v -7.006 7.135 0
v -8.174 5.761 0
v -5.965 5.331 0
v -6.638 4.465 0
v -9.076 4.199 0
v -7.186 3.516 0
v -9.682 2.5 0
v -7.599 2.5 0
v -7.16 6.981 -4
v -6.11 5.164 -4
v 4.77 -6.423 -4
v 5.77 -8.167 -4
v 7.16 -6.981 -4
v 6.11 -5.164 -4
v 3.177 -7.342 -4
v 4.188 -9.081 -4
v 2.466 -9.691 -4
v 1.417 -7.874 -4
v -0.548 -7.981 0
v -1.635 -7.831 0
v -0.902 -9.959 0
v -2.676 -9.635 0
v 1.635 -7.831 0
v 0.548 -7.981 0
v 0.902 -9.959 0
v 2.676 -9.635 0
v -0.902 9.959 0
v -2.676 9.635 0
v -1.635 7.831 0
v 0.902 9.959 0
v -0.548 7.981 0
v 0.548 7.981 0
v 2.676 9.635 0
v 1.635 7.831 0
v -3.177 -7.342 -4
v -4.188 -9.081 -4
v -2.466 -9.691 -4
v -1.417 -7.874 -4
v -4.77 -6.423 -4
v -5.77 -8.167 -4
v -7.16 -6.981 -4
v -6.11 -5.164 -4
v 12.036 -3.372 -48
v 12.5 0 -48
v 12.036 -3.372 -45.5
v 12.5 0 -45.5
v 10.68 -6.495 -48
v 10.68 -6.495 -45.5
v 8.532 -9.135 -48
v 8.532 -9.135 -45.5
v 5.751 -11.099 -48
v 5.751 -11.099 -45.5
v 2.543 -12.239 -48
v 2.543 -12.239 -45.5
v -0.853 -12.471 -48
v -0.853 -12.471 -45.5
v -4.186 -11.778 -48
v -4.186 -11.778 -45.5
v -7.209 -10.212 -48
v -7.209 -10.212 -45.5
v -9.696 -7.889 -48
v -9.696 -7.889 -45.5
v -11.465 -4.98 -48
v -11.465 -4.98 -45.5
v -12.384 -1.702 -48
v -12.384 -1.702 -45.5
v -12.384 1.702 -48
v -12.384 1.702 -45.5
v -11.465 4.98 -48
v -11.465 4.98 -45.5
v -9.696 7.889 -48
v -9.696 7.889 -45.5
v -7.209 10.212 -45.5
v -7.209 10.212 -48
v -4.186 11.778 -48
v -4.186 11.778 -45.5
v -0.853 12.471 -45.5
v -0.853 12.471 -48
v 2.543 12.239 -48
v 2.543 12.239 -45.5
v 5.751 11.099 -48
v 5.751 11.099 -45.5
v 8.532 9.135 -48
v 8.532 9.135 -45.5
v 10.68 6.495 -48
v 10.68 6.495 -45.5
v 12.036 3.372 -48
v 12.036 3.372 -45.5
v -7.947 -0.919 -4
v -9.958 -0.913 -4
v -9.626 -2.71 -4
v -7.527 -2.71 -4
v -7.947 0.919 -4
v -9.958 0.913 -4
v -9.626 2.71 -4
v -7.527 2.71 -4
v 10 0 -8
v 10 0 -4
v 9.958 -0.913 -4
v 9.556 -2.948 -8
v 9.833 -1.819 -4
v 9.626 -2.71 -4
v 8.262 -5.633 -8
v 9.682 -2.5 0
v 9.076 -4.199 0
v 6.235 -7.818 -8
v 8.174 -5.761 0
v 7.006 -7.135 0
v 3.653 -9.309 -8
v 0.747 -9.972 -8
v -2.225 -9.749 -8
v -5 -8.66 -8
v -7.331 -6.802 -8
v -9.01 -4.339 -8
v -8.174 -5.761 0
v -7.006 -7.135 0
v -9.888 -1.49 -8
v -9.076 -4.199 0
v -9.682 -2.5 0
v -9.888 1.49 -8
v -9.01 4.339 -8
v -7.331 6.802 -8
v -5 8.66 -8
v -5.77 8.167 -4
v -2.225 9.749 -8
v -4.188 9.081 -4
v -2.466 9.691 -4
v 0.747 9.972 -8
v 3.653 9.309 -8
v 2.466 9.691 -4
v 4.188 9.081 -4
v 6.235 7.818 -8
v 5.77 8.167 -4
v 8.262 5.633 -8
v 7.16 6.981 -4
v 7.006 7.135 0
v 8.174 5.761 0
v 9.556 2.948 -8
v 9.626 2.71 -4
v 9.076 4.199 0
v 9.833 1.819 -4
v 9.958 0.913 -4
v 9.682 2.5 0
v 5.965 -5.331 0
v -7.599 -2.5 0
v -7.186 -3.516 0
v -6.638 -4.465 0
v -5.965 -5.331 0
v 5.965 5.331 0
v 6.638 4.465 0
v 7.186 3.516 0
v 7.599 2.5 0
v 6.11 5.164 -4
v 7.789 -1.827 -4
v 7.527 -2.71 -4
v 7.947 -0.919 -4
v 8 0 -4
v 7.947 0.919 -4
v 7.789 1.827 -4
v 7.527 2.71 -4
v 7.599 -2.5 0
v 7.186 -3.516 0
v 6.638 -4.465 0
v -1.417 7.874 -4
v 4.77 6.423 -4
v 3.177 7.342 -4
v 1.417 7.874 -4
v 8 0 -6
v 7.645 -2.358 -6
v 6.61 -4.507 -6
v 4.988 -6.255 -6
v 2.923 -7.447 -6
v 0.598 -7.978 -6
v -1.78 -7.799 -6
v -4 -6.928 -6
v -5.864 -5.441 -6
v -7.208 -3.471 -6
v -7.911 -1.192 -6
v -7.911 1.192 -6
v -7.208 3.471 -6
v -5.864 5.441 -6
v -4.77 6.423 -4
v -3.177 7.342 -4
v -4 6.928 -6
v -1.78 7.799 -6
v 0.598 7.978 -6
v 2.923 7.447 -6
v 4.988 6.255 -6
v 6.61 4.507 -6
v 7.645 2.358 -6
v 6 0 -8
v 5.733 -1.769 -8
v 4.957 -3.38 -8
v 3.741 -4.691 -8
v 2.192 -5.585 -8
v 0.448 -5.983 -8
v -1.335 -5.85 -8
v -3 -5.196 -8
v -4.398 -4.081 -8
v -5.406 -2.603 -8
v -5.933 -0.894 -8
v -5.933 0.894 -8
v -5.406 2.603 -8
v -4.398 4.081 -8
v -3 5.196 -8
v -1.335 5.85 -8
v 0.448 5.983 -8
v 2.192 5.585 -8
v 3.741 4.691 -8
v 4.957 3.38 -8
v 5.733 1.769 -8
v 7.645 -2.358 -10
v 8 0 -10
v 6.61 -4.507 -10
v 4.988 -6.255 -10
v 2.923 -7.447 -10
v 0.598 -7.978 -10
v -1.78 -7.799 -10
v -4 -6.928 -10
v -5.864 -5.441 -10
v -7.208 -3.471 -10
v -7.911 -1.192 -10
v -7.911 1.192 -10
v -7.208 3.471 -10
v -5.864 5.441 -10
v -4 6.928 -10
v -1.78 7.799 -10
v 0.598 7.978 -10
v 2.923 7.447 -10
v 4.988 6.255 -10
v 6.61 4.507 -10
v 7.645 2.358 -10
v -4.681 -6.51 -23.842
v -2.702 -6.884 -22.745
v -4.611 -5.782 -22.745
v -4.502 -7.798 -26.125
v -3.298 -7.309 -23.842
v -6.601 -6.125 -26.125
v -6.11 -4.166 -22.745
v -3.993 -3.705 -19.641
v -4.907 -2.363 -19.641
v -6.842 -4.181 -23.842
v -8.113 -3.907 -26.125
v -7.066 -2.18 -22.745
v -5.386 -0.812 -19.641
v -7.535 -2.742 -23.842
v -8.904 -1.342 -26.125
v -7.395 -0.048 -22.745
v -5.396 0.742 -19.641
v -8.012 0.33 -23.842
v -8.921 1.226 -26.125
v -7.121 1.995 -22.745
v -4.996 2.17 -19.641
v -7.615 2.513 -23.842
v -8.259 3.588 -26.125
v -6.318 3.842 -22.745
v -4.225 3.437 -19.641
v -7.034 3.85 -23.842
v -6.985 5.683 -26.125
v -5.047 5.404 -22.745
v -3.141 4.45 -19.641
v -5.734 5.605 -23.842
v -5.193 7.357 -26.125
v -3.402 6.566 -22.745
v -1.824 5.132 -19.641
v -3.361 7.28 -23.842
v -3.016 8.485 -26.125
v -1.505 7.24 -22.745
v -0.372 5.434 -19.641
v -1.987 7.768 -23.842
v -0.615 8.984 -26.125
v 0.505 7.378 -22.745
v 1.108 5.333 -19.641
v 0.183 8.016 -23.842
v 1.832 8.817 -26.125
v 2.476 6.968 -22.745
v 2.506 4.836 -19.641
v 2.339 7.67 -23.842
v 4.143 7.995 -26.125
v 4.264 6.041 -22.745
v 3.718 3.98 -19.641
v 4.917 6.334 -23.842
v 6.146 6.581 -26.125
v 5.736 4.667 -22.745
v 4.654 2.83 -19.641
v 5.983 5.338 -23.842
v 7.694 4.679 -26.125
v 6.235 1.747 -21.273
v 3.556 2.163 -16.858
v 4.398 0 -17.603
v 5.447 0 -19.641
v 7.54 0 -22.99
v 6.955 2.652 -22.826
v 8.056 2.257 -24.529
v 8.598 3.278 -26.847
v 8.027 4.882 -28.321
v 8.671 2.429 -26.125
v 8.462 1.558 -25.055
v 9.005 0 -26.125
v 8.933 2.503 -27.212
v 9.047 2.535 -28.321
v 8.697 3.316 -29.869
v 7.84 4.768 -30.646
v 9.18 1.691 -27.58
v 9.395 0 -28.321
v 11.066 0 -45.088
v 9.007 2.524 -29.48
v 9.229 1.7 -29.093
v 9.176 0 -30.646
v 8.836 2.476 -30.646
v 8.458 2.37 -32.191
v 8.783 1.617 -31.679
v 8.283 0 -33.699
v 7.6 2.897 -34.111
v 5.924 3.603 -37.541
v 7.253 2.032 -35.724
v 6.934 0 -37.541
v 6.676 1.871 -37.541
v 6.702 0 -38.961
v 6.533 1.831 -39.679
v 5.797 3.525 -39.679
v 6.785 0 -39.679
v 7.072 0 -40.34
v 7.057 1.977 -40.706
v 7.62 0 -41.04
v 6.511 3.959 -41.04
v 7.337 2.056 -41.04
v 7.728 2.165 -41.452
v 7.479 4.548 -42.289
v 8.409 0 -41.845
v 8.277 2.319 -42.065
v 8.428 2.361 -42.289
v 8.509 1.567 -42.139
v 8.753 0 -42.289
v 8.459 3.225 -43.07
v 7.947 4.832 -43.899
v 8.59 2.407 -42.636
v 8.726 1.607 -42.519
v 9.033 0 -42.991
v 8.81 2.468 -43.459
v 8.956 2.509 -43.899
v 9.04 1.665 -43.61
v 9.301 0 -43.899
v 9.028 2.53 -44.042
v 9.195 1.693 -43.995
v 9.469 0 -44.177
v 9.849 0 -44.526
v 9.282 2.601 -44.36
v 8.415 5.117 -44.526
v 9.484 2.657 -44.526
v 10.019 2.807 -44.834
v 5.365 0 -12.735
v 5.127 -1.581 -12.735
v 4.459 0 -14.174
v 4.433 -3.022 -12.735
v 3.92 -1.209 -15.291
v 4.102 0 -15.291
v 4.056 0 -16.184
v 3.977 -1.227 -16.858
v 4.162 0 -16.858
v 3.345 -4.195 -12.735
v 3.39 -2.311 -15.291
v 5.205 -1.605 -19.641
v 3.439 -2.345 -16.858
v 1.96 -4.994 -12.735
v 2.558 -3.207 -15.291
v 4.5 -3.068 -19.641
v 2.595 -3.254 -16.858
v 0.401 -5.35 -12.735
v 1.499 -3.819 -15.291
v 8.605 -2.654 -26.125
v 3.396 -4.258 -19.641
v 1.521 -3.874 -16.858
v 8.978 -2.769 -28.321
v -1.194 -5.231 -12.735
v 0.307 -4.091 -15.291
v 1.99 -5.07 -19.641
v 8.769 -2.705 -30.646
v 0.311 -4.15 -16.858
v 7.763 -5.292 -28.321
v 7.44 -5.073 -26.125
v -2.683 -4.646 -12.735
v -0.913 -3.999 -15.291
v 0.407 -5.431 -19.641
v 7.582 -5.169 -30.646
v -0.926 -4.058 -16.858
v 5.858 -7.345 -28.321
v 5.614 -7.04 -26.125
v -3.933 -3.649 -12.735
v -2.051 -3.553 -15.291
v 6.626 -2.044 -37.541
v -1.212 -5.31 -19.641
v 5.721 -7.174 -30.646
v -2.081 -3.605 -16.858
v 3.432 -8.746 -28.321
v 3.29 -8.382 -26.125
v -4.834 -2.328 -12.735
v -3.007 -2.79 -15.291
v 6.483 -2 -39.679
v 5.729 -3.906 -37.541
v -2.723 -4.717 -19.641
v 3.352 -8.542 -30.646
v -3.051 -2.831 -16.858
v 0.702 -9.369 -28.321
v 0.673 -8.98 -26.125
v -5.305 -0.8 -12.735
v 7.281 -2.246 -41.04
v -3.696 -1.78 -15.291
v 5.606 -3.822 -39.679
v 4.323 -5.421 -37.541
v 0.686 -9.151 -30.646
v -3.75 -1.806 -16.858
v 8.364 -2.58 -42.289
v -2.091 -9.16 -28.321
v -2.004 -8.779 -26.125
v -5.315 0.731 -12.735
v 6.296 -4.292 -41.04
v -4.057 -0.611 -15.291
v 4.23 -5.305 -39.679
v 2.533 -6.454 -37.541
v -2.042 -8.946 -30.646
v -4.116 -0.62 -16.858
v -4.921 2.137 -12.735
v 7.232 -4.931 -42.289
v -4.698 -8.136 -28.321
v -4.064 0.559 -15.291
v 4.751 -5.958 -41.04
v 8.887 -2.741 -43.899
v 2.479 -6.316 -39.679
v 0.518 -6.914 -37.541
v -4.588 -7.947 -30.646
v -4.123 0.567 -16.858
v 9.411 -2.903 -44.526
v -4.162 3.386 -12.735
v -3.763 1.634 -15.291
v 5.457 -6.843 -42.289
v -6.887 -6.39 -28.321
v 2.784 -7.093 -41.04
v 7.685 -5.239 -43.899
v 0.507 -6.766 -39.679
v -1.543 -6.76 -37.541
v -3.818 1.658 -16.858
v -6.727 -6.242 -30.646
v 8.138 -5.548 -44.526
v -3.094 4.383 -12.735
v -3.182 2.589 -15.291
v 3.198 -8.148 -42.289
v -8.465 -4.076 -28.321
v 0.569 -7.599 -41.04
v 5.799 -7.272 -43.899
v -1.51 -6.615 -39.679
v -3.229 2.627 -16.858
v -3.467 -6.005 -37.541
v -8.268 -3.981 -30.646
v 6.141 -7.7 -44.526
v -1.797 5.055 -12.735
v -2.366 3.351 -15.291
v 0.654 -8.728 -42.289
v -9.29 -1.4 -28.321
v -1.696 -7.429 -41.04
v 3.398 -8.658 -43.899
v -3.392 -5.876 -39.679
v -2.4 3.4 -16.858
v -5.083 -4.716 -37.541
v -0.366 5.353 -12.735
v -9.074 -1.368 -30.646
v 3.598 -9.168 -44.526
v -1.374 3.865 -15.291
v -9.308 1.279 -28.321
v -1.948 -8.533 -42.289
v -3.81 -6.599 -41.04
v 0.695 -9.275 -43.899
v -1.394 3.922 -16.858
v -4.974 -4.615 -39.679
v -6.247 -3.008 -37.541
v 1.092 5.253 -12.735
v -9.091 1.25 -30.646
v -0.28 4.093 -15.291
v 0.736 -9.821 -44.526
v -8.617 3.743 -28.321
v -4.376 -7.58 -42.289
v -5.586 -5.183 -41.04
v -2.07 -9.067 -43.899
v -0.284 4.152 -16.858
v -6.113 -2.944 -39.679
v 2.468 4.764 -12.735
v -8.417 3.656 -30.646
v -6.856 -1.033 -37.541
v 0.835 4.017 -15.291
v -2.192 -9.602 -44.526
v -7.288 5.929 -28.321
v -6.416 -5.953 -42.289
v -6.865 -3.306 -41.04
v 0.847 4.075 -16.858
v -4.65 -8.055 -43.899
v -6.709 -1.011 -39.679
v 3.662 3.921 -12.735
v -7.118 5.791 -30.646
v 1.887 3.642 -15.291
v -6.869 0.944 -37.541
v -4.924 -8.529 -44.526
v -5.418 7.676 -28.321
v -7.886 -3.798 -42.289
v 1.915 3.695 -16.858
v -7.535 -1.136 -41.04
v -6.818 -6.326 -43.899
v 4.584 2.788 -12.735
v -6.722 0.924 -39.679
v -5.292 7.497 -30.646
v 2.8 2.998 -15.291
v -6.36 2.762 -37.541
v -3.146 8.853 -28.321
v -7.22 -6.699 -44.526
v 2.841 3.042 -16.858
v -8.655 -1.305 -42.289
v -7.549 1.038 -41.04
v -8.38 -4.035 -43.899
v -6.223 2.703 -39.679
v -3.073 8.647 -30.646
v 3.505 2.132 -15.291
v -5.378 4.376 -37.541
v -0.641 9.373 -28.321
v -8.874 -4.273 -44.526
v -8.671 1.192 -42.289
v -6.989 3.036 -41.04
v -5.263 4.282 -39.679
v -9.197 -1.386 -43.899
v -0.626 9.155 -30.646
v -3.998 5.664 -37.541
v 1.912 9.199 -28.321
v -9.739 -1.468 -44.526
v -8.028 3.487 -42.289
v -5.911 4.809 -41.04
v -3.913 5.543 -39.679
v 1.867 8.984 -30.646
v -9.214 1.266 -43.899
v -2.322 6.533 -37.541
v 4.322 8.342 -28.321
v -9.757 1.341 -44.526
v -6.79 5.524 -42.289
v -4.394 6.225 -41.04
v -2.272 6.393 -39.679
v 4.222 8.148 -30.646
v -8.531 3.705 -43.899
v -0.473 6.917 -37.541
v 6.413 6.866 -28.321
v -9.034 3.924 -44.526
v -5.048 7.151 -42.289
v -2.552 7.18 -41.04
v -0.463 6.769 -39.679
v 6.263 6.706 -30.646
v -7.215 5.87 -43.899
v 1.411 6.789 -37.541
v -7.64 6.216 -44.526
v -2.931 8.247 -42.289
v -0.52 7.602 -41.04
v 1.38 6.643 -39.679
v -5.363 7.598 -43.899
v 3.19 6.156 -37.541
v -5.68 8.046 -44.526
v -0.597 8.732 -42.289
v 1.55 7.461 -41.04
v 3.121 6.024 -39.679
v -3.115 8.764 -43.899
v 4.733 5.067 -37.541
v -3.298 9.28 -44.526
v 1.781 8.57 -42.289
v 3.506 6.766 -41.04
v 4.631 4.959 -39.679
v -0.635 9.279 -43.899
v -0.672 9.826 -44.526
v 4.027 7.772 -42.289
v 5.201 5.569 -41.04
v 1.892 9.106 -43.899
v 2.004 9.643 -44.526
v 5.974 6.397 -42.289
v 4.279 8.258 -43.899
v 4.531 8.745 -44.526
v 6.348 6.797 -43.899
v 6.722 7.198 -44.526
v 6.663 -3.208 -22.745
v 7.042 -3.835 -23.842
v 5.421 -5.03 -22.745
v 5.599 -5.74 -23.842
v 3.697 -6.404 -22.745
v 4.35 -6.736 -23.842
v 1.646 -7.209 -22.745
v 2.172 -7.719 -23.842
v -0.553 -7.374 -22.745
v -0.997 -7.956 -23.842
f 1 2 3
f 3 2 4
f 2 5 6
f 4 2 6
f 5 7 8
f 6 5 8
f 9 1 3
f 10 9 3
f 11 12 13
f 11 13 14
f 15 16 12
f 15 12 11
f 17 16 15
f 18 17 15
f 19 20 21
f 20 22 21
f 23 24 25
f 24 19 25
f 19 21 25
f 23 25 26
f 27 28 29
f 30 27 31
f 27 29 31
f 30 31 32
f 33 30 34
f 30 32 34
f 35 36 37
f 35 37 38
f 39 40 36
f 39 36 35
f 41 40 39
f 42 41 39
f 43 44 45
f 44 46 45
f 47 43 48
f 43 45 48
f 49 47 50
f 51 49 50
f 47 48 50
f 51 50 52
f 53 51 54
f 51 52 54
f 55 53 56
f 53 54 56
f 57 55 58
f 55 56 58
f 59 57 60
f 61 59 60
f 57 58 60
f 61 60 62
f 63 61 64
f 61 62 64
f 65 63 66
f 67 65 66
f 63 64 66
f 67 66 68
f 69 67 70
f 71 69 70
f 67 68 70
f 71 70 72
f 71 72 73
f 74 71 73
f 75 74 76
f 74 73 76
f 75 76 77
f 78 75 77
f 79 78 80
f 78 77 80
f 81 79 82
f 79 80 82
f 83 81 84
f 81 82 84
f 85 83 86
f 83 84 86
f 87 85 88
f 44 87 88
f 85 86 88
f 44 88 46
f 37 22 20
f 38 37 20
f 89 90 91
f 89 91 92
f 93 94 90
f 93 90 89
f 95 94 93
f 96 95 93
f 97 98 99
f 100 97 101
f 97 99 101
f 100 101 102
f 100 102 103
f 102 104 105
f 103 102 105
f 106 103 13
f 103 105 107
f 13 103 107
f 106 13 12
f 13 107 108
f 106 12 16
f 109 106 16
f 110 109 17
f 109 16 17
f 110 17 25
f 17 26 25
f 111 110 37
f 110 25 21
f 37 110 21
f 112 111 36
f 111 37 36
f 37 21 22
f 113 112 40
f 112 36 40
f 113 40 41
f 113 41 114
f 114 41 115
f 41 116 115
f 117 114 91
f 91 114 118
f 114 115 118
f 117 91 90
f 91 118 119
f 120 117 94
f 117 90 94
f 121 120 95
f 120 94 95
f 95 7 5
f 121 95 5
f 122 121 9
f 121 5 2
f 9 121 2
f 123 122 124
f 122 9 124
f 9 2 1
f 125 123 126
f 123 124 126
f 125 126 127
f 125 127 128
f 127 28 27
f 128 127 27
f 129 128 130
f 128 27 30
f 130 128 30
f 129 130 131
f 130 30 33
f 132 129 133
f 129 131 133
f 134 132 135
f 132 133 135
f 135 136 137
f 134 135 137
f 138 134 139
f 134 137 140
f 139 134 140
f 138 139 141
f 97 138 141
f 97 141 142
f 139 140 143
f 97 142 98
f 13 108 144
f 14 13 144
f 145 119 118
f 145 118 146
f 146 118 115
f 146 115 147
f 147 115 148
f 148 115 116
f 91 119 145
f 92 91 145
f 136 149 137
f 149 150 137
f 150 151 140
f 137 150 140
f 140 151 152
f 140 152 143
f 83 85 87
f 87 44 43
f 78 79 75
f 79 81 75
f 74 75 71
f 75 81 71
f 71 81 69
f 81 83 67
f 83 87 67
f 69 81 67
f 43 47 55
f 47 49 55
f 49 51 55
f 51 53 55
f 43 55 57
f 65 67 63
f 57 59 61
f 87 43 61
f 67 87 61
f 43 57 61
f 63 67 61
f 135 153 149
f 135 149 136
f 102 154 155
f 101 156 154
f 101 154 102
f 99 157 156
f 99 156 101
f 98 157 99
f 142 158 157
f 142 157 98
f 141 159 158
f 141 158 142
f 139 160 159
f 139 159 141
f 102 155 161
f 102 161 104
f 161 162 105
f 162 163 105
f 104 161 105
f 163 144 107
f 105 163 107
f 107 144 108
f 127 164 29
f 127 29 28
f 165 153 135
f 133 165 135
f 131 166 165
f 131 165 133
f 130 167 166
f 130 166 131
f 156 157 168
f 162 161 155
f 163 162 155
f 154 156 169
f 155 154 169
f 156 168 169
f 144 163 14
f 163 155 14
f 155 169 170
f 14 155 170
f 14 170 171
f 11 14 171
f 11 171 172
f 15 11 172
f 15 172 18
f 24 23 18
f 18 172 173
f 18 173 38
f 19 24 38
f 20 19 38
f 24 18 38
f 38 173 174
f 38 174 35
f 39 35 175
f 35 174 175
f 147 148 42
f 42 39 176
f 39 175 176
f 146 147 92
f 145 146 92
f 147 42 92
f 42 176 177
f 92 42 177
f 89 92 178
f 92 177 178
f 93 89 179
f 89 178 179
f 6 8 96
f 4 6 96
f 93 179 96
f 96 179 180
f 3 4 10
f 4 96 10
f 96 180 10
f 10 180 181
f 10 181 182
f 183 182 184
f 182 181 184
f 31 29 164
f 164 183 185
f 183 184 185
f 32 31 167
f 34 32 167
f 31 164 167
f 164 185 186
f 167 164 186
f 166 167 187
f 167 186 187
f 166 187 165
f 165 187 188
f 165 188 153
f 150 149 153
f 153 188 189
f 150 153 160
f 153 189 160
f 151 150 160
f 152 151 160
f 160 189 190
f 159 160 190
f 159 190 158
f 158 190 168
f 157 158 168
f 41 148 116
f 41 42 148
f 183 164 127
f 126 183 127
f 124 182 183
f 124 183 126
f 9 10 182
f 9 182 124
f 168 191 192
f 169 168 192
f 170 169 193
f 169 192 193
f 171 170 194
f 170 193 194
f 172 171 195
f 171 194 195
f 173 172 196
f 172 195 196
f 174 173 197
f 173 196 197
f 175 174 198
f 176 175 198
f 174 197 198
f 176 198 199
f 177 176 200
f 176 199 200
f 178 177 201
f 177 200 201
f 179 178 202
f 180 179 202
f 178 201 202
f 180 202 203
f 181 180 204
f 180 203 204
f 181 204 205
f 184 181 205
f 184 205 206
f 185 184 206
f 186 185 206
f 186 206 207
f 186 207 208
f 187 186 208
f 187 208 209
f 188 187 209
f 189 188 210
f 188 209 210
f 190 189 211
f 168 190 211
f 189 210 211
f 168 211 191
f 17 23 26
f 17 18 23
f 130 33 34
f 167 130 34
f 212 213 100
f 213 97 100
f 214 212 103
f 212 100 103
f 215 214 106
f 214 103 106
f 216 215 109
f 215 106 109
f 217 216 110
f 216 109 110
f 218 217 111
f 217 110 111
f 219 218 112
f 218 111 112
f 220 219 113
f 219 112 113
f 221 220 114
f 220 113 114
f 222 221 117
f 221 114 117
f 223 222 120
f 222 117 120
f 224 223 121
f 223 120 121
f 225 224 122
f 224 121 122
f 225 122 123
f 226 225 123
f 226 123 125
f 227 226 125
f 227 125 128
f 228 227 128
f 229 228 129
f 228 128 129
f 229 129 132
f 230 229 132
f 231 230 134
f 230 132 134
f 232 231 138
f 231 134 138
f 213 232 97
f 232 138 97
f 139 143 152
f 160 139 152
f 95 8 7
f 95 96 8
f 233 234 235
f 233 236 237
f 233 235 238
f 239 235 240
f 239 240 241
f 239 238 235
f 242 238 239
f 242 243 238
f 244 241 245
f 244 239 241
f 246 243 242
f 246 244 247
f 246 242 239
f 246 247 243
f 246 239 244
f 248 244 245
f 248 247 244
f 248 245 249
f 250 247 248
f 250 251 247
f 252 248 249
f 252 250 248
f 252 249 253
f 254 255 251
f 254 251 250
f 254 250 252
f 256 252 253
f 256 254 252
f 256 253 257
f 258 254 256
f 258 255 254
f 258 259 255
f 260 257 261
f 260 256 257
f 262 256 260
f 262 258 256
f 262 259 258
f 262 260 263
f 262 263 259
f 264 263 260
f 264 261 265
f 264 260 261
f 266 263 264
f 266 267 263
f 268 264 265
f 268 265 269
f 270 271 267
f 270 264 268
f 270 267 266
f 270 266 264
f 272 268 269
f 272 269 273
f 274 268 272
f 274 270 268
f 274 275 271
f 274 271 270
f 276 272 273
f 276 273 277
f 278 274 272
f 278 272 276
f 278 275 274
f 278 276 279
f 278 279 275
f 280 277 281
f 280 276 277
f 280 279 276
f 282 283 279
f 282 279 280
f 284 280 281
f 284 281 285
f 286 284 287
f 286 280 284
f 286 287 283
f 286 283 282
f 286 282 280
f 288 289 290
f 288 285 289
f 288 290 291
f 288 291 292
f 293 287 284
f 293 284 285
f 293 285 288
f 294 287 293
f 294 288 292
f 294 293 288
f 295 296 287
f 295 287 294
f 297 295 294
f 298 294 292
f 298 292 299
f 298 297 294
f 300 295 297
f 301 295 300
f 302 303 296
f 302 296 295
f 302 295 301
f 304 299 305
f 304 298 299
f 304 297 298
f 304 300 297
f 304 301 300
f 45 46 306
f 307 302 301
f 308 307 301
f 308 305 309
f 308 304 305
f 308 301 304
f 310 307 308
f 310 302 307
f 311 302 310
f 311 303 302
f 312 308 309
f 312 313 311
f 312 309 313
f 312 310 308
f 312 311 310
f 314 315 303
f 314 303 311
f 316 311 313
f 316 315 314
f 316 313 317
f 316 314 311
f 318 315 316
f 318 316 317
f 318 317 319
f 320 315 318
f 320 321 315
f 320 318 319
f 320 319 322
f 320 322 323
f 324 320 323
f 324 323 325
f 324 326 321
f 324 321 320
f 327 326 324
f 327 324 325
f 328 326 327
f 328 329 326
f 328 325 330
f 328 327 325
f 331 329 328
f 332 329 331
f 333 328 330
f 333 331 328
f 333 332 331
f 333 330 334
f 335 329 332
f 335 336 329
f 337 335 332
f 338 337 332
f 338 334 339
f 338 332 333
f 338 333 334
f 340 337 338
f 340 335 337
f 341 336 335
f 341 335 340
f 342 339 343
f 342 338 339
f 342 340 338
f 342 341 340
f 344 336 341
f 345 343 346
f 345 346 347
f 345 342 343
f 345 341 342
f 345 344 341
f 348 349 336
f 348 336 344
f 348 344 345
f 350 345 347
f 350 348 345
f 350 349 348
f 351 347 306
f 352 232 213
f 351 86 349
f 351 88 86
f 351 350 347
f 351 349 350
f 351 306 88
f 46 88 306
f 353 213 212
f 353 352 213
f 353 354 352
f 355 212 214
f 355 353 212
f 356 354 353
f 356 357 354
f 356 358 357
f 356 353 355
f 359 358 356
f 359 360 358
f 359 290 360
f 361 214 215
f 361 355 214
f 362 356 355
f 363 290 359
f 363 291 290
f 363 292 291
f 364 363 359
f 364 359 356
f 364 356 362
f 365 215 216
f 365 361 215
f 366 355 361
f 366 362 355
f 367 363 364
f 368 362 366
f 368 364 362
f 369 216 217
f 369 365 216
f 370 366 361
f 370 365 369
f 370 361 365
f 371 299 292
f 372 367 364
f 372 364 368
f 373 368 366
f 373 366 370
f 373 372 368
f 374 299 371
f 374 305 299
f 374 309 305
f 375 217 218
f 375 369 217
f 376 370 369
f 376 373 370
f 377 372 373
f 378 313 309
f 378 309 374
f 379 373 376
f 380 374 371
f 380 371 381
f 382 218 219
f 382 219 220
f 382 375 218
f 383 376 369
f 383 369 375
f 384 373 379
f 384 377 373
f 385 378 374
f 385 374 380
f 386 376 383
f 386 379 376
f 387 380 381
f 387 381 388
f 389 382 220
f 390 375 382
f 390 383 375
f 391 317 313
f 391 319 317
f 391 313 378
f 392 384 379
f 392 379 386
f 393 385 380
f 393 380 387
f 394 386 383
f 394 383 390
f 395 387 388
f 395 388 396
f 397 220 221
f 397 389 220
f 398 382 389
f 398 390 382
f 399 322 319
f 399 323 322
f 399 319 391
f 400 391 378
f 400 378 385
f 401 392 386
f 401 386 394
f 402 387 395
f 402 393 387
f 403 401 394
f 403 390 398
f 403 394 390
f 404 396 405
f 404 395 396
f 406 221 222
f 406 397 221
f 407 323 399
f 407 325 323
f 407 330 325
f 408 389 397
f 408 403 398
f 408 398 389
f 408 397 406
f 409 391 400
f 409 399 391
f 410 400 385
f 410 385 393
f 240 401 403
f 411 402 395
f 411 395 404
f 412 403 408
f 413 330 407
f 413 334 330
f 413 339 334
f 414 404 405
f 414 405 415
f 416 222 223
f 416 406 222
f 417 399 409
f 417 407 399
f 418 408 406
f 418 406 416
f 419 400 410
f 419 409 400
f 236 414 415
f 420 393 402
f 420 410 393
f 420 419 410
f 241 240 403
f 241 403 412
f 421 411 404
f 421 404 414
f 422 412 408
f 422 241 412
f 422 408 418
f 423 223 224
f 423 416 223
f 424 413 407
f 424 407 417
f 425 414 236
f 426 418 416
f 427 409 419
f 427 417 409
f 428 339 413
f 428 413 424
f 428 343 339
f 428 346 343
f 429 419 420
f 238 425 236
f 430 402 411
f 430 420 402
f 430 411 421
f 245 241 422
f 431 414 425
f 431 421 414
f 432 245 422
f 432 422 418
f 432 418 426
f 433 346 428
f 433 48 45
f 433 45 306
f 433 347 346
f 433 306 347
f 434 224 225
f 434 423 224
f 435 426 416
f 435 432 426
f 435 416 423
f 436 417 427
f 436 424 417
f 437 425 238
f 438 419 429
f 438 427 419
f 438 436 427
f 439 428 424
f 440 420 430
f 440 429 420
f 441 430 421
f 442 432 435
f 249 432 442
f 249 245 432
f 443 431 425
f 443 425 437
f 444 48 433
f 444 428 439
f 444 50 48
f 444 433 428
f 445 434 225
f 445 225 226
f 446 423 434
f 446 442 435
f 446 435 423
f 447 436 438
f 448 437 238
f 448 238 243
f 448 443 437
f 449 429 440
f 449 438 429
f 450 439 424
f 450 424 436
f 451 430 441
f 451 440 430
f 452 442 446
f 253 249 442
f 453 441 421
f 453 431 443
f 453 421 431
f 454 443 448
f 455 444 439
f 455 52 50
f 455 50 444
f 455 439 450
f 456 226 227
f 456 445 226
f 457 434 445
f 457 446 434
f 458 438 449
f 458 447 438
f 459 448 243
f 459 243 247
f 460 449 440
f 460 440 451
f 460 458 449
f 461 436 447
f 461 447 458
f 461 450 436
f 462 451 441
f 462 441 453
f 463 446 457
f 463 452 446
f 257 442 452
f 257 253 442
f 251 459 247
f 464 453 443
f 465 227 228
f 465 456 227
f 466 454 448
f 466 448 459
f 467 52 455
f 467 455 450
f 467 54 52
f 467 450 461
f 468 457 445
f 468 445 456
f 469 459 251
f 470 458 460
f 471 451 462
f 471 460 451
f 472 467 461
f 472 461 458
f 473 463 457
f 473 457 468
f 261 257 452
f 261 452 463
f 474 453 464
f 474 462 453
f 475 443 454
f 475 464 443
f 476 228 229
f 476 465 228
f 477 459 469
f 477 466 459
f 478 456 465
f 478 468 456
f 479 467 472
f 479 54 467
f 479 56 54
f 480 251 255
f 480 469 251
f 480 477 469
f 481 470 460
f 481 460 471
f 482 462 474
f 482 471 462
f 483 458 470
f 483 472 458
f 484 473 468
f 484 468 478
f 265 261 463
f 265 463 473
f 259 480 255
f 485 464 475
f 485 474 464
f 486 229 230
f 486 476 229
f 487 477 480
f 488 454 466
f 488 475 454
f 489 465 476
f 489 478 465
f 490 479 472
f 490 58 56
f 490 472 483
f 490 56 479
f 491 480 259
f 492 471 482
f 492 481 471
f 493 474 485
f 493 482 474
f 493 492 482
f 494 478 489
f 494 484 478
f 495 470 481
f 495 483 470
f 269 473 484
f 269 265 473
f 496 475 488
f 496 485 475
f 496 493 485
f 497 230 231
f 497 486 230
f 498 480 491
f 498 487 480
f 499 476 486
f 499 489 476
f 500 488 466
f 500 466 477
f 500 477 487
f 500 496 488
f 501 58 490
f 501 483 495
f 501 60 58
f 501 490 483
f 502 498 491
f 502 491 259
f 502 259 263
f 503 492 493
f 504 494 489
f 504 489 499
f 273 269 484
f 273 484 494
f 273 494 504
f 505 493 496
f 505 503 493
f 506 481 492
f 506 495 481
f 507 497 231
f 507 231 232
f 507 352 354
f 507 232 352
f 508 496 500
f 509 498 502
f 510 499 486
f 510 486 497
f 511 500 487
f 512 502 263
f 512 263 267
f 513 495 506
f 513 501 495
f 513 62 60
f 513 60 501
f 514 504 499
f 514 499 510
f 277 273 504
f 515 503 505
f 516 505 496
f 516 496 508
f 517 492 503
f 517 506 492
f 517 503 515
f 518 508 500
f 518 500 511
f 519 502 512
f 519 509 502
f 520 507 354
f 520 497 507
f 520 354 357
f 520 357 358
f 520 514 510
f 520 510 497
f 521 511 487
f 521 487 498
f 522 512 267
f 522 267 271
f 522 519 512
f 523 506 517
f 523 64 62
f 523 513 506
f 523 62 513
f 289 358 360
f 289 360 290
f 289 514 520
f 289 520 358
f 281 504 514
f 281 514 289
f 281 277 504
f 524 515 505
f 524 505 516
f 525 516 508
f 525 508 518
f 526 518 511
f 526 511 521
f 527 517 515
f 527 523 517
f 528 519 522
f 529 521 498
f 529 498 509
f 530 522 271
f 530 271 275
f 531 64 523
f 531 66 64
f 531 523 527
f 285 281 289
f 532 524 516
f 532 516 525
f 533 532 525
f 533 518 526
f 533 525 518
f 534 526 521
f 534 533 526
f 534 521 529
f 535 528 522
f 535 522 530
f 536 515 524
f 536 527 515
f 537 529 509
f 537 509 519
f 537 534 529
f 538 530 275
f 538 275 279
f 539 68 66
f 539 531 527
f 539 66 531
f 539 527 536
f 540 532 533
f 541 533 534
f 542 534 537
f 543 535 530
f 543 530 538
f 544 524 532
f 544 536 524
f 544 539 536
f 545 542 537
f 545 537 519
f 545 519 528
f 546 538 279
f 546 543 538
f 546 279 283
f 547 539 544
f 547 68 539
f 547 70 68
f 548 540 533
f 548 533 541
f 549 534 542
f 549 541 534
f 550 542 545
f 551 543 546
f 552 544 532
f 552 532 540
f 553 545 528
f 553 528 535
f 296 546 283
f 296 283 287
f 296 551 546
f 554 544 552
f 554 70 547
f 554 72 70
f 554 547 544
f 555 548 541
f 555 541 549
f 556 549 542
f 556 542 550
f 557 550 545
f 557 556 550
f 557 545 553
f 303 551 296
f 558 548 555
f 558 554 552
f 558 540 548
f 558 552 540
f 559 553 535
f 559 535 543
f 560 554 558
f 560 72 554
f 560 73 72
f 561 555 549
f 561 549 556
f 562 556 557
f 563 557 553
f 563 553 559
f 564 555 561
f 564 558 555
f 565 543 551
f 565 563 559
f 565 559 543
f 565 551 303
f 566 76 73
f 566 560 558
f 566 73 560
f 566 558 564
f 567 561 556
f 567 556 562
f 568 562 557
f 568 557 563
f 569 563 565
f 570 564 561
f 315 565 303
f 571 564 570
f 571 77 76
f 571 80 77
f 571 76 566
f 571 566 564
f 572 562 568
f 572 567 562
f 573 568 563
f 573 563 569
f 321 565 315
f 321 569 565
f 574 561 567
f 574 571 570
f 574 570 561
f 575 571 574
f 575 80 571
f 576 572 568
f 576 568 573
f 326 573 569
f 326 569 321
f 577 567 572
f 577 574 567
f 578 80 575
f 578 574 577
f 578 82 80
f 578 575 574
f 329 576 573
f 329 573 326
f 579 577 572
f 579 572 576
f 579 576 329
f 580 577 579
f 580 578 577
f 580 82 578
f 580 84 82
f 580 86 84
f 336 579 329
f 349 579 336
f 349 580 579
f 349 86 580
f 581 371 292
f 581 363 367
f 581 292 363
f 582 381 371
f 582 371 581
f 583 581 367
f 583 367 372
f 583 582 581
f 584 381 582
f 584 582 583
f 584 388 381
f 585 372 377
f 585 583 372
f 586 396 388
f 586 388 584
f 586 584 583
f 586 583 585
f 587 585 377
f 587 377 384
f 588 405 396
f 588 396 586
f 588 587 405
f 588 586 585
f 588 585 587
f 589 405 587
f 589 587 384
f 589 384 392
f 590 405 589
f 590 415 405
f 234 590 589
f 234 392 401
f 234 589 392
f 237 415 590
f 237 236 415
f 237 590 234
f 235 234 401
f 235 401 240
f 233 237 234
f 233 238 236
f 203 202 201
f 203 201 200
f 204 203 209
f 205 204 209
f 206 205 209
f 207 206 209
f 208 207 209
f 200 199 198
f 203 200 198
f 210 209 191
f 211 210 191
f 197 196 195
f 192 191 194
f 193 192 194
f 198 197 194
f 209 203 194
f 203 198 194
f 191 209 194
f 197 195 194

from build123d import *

# Parameters (mm, degrees)
F0_W            = 12.5
F0_H            = 2.5
F2_W            = 30
F2_H            = 5
F3_DEPTH        = 4
F3_TAPER        = -3
F3_COPIES_COUNT = 3
F3_COPIES_ANGLE = 120
F4_SIZE         = 2


# Not quite as in the source:
# - a pattern or mirror of a feature is missing from the dataset's text; its kind, count and spacing are read off the source's solid


with BuildPart() as f1:
    # F0 (on Front) → F1 (revolve)
    with BuildSketch(Plane.XZ):
        Polygon((10, 0), (8, 0), (8, -8), (0, -8), (0, -10), (8, -10), (10, -8), align=None)
        with BuildLine():
            Line((8, -10), (0, -10))
            Line((0, -10), (0, -45.5))
            Line((0, -45.5), (12.5, -45.5))
            add(Edge.make_bspline(
                [(8, -10), (5.9036325589, -11.9965153095), (1.0129290603, -16.5253438832), (13.2882333552, -27.2092652156), (4.5052088966, -39.5192070851), (9.2502525397, -41.9720056367), (8.9567015183, -44.5926383173), (11.3466967049, -45.1906230325), (12.5, -45.5)],
                knots=[0, 0, 0, 0, 0.1843856525, 0.4236571978, 0.6554974409, 0.7819959318, 0.8777293444, 1, 1, 1, 1], degree=3))
        make_face()
        with Locations((6.25, -46.75)):
            Rectangle(F0_W, F0_H)
    revolve(axis=Axis((0, 0, -24), (0, 0, -1)))

    # F2 (on face) → F3 (cut)
    with BuildSketch(Plane.XY):
        Rectangle(F2_W, F2_H)
    f3 = extrude(amount=-F3_DEPTH, taper=F3_TAPER, mode=Mode.SUBTRACT)

    # F3_copies: F3 ×3 about axis
    f3_copies_axis = Axis((0, 0, 0), (0, 0, 1))
    for i in range(1, F3_COPIES_COUNT):
        add(f3.rotate(f3_copies_axis, i * F3_COPIES_ANGLE / (F3_COPIES_COUNT - 1)), mode=Mode.SUBTRACT)

    # F4
    f4_edges = [f1.edges().sort_by_distance(p)[0] for p in [
        (-8, 0, -8),
    ]]
    chamfer(f4_edges, length=F4_SIZE)


solid = f1.part
